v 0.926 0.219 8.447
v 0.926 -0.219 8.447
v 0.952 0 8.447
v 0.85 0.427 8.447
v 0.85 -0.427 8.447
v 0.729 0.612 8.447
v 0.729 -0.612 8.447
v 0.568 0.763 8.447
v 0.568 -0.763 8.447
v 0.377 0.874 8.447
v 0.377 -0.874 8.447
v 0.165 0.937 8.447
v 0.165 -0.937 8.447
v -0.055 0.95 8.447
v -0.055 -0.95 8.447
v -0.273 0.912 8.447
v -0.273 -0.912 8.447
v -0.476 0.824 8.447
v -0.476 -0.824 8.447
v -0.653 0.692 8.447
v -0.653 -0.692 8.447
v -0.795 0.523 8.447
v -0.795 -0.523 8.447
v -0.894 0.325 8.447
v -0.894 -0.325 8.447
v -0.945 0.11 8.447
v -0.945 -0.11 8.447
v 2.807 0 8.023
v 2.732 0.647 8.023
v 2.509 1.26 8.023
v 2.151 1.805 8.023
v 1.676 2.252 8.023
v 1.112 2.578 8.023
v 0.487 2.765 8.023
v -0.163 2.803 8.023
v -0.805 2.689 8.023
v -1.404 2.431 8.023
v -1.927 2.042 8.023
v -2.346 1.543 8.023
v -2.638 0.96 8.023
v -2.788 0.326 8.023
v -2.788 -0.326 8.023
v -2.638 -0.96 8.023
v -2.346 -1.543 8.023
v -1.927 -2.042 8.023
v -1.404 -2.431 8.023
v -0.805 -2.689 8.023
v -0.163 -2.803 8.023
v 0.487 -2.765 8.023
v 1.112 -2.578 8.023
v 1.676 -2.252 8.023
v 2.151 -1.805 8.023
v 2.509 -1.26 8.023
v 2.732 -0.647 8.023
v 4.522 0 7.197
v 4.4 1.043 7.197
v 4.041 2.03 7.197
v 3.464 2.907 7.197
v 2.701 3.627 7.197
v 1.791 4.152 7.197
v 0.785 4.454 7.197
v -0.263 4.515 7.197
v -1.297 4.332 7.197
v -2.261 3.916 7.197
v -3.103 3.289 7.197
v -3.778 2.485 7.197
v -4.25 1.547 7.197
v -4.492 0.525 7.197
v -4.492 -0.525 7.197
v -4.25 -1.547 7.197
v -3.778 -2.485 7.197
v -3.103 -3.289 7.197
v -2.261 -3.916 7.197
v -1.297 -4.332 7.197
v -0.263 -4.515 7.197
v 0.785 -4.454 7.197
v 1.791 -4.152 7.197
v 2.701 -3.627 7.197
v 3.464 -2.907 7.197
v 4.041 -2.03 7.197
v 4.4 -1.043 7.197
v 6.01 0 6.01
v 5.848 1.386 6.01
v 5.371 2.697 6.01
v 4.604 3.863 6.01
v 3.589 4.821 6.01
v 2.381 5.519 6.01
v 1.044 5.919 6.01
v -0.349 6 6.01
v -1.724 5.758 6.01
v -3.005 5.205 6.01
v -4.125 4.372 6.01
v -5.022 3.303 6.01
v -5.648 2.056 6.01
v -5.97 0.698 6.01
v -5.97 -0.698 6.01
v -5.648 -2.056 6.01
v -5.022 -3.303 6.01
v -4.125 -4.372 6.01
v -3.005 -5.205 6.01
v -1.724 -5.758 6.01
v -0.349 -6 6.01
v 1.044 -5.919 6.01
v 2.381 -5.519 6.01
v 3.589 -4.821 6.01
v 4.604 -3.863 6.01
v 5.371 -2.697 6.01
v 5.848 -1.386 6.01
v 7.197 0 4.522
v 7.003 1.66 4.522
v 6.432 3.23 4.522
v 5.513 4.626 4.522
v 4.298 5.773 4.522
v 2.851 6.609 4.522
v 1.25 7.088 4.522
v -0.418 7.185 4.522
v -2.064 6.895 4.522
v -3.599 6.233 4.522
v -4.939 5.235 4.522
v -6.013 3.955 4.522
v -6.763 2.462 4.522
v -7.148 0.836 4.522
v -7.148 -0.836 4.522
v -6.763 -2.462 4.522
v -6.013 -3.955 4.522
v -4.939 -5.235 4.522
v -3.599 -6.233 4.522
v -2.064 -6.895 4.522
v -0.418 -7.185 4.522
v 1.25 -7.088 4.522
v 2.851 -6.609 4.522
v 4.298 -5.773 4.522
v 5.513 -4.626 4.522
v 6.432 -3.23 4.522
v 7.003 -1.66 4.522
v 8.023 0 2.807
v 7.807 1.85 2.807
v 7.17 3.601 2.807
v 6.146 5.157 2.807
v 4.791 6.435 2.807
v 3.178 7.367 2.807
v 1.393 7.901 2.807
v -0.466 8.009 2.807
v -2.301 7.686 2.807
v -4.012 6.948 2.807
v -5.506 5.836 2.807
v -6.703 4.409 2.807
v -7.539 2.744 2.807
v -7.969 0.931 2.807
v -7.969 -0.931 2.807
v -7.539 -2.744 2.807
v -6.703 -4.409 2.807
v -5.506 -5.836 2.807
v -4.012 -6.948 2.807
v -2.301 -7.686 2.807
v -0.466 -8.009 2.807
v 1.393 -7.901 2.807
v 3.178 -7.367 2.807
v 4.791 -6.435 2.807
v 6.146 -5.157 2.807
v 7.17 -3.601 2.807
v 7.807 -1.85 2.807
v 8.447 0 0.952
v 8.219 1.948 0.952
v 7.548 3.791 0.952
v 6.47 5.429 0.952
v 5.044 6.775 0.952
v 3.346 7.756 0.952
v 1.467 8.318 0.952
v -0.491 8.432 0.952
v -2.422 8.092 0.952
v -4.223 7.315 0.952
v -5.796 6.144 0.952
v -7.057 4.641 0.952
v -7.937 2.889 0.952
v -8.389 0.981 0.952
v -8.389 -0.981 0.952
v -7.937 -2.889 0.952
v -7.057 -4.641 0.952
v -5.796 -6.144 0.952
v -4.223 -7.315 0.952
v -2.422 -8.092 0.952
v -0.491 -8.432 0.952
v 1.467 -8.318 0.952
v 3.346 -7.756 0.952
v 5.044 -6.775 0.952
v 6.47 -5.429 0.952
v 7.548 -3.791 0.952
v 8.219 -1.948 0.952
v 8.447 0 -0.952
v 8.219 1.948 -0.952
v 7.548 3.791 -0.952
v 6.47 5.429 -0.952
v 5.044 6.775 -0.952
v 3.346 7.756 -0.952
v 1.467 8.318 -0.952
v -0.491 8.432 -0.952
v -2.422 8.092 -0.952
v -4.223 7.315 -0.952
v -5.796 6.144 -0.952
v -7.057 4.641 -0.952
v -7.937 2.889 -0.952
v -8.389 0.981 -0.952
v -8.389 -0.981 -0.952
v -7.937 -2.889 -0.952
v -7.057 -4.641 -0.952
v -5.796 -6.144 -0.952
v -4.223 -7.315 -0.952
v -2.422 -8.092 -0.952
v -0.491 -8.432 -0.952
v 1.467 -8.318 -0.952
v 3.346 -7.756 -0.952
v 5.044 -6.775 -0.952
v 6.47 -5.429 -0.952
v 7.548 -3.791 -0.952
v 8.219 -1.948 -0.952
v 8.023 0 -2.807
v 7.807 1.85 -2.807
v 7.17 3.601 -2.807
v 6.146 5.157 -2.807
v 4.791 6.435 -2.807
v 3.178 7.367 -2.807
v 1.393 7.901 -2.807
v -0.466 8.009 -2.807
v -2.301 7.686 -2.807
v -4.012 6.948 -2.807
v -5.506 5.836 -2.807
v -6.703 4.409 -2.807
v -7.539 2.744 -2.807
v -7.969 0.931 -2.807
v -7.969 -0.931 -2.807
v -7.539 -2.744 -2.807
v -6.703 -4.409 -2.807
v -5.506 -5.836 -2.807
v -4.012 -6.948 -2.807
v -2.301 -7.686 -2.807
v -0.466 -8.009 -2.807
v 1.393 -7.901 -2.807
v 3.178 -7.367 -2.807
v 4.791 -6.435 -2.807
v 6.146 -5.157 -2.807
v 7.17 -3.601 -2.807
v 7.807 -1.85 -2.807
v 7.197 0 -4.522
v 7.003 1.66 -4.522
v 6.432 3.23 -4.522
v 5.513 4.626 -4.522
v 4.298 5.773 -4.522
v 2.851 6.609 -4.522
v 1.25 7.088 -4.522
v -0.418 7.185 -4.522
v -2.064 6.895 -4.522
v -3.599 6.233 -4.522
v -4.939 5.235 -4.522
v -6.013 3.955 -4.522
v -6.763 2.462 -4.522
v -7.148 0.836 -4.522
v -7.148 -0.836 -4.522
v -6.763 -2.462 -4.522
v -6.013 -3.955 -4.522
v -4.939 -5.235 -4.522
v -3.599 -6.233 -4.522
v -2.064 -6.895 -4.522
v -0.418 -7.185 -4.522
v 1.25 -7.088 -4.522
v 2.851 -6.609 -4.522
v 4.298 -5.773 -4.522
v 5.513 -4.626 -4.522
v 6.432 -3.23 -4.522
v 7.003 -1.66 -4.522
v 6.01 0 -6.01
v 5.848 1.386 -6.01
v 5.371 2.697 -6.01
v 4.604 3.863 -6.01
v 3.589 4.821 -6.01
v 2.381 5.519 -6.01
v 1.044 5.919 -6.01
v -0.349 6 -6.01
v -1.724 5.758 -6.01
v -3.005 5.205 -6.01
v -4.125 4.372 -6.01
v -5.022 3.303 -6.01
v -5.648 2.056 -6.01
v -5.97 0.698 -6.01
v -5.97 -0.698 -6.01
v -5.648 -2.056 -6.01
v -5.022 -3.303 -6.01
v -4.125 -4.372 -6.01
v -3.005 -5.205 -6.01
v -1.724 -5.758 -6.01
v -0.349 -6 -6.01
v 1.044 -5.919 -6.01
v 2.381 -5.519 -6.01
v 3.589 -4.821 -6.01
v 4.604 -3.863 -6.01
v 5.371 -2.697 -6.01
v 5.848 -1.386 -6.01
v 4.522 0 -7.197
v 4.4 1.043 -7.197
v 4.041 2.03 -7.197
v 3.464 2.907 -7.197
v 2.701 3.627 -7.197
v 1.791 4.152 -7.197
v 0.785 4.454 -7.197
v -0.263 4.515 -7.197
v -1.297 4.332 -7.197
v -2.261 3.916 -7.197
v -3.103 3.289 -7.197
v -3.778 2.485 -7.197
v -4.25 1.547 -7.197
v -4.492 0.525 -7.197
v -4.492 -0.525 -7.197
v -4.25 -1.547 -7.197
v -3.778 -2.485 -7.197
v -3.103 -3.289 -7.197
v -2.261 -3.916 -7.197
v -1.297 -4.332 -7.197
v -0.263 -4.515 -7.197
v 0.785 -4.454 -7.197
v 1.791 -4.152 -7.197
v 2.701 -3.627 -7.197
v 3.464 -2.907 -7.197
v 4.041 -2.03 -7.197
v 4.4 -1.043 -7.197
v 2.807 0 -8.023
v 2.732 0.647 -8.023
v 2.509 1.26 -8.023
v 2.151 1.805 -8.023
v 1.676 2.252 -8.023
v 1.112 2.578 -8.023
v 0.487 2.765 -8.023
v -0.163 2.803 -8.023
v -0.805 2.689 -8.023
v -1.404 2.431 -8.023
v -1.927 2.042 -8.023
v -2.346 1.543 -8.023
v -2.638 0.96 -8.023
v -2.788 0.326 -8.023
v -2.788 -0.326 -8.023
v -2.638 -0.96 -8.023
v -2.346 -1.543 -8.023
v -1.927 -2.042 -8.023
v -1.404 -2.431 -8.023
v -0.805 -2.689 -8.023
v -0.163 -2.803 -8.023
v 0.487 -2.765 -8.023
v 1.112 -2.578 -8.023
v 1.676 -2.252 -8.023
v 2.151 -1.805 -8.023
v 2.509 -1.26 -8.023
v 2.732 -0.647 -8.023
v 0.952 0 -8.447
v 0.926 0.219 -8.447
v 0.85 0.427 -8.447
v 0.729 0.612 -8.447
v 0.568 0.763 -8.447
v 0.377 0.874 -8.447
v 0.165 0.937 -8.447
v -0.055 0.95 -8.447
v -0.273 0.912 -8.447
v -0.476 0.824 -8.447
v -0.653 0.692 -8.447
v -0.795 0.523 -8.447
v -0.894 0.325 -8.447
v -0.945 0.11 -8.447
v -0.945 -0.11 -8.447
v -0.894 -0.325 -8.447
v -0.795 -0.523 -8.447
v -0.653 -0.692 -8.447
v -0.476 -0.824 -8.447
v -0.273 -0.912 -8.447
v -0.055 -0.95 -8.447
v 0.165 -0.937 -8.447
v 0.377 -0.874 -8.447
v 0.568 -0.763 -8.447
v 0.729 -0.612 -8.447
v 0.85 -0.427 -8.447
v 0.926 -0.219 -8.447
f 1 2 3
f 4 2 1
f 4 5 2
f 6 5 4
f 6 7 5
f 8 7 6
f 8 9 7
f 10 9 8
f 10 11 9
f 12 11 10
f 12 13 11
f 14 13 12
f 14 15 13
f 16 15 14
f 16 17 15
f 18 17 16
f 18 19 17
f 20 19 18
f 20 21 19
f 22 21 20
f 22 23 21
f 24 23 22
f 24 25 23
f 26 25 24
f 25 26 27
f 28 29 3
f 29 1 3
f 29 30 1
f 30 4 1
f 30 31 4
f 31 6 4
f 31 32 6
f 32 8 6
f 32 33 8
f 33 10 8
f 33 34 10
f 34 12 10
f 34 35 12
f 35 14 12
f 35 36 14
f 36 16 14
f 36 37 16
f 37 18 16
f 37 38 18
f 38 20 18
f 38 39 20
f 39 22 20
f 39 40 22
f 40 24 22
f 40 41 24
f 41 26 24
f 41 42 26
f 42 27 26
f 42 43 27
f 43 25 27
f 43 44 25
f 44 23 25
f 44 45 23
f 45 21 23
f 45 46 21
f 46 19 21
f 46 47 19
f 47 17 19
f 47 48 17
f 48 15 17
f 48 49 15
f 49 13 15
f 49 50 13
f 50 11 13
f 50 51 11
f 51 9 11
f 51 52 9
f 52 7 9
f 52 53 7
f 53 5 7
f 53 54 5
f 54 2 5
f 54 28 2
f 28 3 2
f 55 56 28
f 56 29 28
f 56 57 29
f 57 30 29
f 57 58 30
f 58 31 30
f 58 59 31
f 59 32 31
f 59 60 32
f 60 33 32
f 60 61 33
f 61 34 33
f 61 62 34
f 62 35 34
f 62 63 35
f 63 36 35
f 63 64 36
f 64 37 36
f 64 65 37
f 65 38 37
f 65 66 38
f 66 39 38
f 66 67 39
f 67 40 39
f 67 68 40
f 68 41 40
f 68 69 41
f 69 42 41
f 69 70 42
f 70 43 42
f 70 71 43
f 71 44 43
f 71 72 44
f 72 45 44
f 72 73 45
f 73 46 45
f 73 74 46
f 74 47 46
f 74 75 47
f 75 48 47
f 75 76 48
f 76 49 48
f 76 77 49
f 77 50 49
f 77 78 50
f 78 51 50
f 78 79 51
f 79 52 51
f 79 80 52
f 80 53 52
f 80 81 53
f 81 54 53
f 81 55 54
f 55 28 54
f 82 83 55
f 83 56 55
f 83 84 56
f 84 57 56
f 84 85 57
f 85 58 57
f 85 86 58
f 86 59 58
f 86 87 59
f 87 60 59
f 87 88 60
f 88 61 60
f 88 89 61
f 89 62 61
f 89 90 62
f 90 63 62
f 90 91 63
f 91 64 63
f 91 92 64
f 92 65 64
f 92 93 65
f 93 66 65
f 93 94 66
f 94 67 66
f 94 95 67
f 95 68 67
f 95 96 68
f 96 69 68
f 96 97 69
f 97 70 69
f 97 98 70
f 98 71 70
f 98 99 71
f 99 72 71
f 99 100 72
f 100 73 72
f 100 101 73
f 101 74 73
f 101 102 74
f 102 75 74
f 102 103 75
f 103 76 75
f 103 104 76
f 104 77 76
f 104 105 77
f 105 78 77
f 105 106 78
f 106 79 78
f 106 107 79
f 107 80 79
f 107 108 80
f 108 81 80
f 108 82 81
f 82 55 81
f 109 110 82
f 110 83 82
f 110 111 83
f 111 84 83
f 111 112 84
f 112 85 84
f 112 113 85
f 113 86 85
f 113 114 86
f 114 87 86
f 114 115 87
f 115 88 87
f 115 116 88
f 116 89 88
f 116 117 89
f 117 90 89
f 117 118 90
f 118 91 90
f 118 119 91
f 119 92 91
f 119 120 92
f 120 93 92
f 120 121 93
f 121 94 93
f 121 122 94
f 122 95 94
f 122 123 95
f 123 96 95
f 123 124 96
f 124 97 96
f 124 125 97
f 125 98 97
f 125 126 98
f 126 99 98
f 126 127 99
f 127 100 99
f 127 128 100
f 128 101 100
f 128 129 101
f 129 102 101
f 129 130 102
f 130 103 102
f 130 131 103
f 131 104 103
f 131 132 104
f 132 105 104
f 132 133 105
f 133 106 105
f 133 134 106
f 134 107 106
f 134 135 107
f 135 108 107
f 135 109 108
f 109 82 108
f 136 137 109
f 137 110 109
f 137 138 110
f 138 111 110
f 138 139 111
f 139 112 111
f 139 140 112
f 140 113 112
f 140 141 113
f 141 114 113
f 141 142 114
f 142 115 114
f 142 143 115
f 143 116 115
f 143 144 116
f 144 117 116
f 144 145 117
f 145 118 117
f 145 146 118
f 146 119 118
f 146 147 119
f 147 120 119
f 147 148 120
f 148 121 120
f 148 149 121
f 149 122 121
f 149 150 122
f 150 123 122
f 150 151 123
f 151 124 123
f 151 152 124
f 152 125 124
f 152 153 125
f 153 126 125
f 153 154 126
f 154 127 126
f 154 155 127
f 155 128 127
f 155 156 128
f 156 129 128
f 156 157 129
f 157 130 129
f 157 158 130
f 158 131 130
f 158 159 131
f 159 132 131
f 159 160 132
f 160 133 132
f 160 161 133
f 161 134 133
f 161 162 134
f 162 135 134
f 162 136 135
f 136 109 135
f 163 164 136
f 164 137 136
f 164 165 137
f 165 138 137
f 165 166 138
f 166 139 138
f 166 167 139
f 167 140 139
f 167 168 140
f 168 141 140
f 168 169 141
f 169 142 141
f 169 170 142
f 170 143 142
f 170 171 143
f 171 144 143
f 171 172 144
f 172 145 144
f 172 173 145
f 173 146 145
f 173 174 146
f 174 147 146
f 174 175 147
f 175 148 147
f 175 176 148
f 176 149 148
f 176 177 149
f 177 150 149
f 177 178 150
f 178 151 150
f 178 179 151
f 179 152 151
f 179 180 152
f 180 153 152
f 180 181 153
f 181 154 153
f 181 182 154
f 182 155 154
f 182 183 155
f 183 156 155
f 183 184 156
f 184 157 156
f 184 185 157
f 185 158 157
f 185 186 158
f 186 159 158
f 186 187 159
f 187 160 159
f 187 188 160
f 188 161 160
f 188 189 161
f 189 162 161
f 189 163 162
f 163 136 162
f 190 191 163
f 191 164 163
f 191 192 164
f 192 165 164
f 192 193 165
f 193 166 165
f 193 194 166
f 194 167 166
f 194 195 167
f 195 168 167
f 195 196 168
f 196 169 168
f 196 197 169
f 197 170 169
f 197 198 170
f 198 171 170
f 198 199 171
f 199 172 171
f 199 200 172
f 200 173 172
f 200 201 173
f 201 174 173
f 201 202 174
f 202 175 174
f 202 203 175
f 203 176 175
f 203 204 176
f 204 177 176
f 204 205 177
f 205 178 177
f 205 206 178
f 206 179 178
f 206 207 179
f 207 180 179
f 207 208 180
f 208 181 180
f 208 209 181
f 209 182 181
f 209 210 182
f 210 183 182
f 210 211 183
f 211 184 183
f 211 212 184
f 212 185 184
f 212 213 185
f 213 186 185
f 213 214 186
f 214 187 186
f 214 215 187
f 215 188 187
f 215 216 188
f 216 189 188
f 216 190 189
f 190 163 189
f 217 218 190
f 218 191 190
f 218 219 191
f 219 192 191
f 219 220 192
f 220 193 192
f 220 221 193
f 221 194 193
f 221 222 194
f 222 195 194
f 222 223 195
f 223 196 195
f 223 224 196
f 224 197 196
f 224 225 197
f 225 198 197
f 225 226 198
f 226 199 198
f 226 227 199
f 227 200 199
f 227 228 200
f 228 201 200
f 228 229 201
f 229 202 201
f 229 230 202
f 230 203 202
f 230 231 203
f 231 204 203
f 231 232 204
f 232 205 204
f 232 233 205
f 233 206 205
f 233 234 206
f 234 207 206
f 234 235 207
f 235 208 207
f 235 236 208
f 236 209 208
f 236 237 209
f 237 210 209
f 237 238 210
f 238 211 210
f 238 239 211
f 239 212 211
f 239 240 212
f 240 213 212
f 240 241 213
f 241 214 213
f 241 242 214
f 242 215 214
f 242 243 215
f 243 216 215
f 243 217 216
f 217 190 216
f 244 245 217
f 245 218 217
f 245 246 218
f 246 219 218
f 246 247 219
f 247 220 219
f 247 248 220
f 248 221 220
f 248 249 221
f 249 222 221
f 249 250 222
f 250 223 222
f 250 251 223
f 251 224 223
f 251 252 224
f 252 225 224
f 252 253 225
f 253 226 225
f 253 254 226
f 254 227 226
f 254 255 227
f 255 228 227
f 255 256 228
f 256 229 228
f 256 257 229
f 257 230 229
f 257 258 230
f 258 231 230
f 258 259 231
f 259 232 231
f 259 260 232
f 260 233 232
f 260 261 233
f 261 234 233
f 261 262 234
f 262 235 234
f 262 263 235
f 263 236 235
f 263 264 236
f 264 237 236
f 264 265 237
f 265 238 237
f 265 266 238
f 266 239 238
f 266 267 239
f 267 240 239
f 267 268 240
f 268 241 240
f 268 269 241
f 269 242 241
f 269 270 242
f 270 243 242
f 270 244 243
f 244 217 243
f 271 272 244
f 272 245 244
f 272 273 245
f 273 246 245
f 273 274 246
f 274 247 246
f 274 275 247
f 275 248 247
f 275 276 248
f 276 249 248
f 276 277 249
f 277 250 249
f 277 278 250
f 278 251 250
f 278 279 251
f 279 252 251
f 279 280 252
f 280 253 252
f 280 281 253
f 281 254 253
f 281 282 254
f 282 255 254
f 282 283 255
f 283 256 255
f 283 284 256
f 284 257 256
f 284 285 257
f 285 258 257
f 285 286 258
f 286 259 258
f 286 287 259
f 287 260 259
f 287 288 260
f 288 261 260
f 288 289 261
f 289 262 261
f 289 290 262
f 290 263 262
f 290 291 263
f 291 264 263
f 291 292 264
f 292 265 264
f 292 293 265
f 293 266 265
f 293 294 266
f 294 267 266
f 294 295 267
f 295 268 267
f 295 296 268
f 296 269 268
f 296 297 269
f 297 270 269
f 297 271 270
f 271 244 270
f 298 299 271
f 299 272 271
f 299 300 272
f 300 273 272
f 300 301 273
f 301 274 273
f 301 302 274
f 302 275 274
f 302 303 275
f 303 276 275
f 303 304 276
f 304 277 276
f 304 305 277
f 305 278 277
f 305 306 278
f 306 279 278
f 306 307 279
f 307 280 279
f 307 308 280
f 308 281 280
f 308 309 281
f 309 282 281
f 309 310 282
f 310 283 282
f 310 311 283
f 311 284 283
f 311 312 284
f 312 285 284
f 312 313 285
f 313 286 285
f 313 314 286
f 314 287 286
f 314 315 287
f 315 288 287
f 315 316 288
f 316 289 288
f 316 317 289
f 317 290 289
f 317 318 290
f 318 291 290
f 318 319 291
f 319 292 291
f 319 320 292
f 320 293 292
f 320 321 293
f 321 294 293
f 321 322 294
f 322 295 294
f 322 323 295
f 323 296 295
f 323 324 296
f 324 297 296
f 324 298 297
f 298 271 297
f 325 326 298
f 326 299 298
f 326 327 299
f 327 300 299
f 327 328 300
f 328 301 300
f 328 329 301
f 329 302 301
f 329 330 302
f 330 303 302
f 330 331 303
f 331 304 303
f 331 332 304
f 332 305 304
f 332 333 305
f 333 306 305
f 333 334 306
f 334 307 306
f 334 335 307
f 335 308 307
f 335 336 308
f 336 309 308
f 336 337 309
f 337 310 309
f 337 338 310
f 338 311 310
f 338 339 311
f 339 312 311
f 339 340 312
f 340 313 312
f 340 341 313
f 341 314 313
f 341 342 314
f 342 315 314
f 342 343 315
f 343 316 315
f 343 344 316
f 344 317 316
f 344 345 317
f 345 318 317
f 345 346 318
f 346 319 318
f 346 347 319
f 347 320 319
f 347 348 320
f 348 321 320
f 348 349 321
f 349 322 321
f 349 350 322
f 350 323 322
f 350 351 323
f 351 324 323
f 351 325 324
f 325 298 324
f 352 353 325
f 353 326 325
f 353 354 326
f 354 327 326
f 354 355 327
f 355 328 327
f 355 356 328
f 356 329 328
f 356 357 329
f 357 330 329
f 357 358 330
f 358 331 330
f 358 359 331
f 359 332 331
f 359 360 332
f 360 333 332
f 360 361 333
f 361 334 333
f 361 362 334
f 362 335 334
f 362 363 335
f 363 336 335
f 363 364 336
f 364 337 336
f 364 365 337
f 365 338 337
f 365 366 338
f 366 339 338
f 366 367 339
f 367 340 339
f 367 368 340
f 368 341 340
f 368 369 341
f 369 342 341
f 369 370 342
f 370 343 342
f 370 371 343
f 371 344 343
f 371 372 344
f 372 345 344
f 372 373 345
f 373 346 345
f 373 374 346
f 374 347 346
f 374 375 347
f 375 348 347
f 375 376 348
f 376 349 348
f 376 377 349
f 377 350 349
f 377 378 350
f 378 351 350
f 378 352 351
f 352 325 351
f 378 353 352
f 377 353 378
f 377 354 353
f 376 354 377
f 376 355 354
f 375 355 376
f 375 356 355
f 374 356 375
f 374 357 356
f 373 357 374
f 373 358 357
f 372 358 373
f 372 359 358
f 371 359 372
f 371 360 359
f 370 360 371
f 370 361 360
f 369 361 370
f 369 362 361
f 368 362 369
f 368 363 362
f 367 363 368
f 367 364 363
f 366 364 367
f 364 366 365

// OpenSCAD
// Generated by SolidPython 1.0.1 on 2020-07-29 00:02:42


sphere(d = 17, r = 7);
/***********************************************
*********      SolidPython code:      **********
************************************************
 
# import packages: SolidPython
from solid import *
from solid.utils import *
from itertools import chain, combinations


class Resize:

    def __init__(self, scad_file):
        self.scad_file = scad_file
        #self.scad_file = import_scad(scad_file)
        # cone/cylinder param:
        self.r1 = 0
        self.r2 = 0
        self.h = 0
        # rectangular prism param:
        self.w = 0
        self.l = 0
        # ellipse param:
        self.r = 0

    # import OpenScad code (file name corresponds to shape)


    # classify shape + parameters
    def assign(self, param1, param2, param3):
        if self.scad_file == 'cone.scad':
            self.r1 = param1
            self.r2 = param2
            self.h = param3
        elif self.scad_file == 'cylinder.scad':
            self.r1 = param1
            self.r2 = param2
            self.h = param3
        elif self.scad_file == 'rectangularPrism.scad':
            self.h = param1
            self.l = param2
            self.w = param3
        else:
            self.r = param1
            self.h = param2

    # resize parameters
    def iterate(self):
        x = range(3, 20, 2)
        i = 1
        if self.scad_file == 'cone.scad':
            tempList = list(combinations(x, 3))
            #print(tempList)
            for i in x:
                for j in range (3):
                    param1 = tempList[i][0]
                    param2 = tempList[i][1]
                    param3 = tempList[i][2]
                    filepath = 'produced_scad_files/' + 'cone' + str(param1) + '_' + str(param2) + '_' + str(param3) + '.scad'
                    scad_render_to_file(cylinder(h=param1, r1=param2, r2=param3), filepath)

        elif self.scad_file == 'cylinder.scad':
            tempList = list(combinations(x, 3))
            for i in x:
                for j in range(3):
                    param1 = tempList[i][0]
                    param2 = tempList[i][1]
                    param3 = tempList[i][2]
                    filepath = 'produced_scad_files/' + 'cylinder' + str(param1) + '_' + str(param2) + '_' + str(param3) + '.scad'
                    scad_render_to_file(cylinder(h=param1, r1=param2, r2=param3), filepath)

        elif self.scad_file == 'rectangularPrism.scad':
            tempList = list(combinations(x, 3))
            for i in x:
                for j in range(3):
                    param1 = tempList[i][0]
                    param2 = tempList[i][1]
                    param3 = tempList[i][2]
                    filepath = 'produced_scad_files/' + 'rectangularPrism' + str(param1) + '_' + str(param2) + '_' + str(
                        param3) + '.scad'
                    scad_render_to_file(cube(size=(param1, param2, param3)), filepath)

        else:
            tempList = list(combinations(x, 2))
            for i in x:
                for j in range(3):
                    param1 = tempList[i][0]
                    param2 = tempList[i][1]
                    filepath = 'produced_scad_files/' + 'ellipse' + str(param1) + '_' + str(param2) + '_' + '.scad'
                    scad_render_to_file(sphere(param1, param2), filepath)

    def render_to_scadfile(self):
        scad_render_to_file(scad, 'example.scad') 
 
************************************************/
